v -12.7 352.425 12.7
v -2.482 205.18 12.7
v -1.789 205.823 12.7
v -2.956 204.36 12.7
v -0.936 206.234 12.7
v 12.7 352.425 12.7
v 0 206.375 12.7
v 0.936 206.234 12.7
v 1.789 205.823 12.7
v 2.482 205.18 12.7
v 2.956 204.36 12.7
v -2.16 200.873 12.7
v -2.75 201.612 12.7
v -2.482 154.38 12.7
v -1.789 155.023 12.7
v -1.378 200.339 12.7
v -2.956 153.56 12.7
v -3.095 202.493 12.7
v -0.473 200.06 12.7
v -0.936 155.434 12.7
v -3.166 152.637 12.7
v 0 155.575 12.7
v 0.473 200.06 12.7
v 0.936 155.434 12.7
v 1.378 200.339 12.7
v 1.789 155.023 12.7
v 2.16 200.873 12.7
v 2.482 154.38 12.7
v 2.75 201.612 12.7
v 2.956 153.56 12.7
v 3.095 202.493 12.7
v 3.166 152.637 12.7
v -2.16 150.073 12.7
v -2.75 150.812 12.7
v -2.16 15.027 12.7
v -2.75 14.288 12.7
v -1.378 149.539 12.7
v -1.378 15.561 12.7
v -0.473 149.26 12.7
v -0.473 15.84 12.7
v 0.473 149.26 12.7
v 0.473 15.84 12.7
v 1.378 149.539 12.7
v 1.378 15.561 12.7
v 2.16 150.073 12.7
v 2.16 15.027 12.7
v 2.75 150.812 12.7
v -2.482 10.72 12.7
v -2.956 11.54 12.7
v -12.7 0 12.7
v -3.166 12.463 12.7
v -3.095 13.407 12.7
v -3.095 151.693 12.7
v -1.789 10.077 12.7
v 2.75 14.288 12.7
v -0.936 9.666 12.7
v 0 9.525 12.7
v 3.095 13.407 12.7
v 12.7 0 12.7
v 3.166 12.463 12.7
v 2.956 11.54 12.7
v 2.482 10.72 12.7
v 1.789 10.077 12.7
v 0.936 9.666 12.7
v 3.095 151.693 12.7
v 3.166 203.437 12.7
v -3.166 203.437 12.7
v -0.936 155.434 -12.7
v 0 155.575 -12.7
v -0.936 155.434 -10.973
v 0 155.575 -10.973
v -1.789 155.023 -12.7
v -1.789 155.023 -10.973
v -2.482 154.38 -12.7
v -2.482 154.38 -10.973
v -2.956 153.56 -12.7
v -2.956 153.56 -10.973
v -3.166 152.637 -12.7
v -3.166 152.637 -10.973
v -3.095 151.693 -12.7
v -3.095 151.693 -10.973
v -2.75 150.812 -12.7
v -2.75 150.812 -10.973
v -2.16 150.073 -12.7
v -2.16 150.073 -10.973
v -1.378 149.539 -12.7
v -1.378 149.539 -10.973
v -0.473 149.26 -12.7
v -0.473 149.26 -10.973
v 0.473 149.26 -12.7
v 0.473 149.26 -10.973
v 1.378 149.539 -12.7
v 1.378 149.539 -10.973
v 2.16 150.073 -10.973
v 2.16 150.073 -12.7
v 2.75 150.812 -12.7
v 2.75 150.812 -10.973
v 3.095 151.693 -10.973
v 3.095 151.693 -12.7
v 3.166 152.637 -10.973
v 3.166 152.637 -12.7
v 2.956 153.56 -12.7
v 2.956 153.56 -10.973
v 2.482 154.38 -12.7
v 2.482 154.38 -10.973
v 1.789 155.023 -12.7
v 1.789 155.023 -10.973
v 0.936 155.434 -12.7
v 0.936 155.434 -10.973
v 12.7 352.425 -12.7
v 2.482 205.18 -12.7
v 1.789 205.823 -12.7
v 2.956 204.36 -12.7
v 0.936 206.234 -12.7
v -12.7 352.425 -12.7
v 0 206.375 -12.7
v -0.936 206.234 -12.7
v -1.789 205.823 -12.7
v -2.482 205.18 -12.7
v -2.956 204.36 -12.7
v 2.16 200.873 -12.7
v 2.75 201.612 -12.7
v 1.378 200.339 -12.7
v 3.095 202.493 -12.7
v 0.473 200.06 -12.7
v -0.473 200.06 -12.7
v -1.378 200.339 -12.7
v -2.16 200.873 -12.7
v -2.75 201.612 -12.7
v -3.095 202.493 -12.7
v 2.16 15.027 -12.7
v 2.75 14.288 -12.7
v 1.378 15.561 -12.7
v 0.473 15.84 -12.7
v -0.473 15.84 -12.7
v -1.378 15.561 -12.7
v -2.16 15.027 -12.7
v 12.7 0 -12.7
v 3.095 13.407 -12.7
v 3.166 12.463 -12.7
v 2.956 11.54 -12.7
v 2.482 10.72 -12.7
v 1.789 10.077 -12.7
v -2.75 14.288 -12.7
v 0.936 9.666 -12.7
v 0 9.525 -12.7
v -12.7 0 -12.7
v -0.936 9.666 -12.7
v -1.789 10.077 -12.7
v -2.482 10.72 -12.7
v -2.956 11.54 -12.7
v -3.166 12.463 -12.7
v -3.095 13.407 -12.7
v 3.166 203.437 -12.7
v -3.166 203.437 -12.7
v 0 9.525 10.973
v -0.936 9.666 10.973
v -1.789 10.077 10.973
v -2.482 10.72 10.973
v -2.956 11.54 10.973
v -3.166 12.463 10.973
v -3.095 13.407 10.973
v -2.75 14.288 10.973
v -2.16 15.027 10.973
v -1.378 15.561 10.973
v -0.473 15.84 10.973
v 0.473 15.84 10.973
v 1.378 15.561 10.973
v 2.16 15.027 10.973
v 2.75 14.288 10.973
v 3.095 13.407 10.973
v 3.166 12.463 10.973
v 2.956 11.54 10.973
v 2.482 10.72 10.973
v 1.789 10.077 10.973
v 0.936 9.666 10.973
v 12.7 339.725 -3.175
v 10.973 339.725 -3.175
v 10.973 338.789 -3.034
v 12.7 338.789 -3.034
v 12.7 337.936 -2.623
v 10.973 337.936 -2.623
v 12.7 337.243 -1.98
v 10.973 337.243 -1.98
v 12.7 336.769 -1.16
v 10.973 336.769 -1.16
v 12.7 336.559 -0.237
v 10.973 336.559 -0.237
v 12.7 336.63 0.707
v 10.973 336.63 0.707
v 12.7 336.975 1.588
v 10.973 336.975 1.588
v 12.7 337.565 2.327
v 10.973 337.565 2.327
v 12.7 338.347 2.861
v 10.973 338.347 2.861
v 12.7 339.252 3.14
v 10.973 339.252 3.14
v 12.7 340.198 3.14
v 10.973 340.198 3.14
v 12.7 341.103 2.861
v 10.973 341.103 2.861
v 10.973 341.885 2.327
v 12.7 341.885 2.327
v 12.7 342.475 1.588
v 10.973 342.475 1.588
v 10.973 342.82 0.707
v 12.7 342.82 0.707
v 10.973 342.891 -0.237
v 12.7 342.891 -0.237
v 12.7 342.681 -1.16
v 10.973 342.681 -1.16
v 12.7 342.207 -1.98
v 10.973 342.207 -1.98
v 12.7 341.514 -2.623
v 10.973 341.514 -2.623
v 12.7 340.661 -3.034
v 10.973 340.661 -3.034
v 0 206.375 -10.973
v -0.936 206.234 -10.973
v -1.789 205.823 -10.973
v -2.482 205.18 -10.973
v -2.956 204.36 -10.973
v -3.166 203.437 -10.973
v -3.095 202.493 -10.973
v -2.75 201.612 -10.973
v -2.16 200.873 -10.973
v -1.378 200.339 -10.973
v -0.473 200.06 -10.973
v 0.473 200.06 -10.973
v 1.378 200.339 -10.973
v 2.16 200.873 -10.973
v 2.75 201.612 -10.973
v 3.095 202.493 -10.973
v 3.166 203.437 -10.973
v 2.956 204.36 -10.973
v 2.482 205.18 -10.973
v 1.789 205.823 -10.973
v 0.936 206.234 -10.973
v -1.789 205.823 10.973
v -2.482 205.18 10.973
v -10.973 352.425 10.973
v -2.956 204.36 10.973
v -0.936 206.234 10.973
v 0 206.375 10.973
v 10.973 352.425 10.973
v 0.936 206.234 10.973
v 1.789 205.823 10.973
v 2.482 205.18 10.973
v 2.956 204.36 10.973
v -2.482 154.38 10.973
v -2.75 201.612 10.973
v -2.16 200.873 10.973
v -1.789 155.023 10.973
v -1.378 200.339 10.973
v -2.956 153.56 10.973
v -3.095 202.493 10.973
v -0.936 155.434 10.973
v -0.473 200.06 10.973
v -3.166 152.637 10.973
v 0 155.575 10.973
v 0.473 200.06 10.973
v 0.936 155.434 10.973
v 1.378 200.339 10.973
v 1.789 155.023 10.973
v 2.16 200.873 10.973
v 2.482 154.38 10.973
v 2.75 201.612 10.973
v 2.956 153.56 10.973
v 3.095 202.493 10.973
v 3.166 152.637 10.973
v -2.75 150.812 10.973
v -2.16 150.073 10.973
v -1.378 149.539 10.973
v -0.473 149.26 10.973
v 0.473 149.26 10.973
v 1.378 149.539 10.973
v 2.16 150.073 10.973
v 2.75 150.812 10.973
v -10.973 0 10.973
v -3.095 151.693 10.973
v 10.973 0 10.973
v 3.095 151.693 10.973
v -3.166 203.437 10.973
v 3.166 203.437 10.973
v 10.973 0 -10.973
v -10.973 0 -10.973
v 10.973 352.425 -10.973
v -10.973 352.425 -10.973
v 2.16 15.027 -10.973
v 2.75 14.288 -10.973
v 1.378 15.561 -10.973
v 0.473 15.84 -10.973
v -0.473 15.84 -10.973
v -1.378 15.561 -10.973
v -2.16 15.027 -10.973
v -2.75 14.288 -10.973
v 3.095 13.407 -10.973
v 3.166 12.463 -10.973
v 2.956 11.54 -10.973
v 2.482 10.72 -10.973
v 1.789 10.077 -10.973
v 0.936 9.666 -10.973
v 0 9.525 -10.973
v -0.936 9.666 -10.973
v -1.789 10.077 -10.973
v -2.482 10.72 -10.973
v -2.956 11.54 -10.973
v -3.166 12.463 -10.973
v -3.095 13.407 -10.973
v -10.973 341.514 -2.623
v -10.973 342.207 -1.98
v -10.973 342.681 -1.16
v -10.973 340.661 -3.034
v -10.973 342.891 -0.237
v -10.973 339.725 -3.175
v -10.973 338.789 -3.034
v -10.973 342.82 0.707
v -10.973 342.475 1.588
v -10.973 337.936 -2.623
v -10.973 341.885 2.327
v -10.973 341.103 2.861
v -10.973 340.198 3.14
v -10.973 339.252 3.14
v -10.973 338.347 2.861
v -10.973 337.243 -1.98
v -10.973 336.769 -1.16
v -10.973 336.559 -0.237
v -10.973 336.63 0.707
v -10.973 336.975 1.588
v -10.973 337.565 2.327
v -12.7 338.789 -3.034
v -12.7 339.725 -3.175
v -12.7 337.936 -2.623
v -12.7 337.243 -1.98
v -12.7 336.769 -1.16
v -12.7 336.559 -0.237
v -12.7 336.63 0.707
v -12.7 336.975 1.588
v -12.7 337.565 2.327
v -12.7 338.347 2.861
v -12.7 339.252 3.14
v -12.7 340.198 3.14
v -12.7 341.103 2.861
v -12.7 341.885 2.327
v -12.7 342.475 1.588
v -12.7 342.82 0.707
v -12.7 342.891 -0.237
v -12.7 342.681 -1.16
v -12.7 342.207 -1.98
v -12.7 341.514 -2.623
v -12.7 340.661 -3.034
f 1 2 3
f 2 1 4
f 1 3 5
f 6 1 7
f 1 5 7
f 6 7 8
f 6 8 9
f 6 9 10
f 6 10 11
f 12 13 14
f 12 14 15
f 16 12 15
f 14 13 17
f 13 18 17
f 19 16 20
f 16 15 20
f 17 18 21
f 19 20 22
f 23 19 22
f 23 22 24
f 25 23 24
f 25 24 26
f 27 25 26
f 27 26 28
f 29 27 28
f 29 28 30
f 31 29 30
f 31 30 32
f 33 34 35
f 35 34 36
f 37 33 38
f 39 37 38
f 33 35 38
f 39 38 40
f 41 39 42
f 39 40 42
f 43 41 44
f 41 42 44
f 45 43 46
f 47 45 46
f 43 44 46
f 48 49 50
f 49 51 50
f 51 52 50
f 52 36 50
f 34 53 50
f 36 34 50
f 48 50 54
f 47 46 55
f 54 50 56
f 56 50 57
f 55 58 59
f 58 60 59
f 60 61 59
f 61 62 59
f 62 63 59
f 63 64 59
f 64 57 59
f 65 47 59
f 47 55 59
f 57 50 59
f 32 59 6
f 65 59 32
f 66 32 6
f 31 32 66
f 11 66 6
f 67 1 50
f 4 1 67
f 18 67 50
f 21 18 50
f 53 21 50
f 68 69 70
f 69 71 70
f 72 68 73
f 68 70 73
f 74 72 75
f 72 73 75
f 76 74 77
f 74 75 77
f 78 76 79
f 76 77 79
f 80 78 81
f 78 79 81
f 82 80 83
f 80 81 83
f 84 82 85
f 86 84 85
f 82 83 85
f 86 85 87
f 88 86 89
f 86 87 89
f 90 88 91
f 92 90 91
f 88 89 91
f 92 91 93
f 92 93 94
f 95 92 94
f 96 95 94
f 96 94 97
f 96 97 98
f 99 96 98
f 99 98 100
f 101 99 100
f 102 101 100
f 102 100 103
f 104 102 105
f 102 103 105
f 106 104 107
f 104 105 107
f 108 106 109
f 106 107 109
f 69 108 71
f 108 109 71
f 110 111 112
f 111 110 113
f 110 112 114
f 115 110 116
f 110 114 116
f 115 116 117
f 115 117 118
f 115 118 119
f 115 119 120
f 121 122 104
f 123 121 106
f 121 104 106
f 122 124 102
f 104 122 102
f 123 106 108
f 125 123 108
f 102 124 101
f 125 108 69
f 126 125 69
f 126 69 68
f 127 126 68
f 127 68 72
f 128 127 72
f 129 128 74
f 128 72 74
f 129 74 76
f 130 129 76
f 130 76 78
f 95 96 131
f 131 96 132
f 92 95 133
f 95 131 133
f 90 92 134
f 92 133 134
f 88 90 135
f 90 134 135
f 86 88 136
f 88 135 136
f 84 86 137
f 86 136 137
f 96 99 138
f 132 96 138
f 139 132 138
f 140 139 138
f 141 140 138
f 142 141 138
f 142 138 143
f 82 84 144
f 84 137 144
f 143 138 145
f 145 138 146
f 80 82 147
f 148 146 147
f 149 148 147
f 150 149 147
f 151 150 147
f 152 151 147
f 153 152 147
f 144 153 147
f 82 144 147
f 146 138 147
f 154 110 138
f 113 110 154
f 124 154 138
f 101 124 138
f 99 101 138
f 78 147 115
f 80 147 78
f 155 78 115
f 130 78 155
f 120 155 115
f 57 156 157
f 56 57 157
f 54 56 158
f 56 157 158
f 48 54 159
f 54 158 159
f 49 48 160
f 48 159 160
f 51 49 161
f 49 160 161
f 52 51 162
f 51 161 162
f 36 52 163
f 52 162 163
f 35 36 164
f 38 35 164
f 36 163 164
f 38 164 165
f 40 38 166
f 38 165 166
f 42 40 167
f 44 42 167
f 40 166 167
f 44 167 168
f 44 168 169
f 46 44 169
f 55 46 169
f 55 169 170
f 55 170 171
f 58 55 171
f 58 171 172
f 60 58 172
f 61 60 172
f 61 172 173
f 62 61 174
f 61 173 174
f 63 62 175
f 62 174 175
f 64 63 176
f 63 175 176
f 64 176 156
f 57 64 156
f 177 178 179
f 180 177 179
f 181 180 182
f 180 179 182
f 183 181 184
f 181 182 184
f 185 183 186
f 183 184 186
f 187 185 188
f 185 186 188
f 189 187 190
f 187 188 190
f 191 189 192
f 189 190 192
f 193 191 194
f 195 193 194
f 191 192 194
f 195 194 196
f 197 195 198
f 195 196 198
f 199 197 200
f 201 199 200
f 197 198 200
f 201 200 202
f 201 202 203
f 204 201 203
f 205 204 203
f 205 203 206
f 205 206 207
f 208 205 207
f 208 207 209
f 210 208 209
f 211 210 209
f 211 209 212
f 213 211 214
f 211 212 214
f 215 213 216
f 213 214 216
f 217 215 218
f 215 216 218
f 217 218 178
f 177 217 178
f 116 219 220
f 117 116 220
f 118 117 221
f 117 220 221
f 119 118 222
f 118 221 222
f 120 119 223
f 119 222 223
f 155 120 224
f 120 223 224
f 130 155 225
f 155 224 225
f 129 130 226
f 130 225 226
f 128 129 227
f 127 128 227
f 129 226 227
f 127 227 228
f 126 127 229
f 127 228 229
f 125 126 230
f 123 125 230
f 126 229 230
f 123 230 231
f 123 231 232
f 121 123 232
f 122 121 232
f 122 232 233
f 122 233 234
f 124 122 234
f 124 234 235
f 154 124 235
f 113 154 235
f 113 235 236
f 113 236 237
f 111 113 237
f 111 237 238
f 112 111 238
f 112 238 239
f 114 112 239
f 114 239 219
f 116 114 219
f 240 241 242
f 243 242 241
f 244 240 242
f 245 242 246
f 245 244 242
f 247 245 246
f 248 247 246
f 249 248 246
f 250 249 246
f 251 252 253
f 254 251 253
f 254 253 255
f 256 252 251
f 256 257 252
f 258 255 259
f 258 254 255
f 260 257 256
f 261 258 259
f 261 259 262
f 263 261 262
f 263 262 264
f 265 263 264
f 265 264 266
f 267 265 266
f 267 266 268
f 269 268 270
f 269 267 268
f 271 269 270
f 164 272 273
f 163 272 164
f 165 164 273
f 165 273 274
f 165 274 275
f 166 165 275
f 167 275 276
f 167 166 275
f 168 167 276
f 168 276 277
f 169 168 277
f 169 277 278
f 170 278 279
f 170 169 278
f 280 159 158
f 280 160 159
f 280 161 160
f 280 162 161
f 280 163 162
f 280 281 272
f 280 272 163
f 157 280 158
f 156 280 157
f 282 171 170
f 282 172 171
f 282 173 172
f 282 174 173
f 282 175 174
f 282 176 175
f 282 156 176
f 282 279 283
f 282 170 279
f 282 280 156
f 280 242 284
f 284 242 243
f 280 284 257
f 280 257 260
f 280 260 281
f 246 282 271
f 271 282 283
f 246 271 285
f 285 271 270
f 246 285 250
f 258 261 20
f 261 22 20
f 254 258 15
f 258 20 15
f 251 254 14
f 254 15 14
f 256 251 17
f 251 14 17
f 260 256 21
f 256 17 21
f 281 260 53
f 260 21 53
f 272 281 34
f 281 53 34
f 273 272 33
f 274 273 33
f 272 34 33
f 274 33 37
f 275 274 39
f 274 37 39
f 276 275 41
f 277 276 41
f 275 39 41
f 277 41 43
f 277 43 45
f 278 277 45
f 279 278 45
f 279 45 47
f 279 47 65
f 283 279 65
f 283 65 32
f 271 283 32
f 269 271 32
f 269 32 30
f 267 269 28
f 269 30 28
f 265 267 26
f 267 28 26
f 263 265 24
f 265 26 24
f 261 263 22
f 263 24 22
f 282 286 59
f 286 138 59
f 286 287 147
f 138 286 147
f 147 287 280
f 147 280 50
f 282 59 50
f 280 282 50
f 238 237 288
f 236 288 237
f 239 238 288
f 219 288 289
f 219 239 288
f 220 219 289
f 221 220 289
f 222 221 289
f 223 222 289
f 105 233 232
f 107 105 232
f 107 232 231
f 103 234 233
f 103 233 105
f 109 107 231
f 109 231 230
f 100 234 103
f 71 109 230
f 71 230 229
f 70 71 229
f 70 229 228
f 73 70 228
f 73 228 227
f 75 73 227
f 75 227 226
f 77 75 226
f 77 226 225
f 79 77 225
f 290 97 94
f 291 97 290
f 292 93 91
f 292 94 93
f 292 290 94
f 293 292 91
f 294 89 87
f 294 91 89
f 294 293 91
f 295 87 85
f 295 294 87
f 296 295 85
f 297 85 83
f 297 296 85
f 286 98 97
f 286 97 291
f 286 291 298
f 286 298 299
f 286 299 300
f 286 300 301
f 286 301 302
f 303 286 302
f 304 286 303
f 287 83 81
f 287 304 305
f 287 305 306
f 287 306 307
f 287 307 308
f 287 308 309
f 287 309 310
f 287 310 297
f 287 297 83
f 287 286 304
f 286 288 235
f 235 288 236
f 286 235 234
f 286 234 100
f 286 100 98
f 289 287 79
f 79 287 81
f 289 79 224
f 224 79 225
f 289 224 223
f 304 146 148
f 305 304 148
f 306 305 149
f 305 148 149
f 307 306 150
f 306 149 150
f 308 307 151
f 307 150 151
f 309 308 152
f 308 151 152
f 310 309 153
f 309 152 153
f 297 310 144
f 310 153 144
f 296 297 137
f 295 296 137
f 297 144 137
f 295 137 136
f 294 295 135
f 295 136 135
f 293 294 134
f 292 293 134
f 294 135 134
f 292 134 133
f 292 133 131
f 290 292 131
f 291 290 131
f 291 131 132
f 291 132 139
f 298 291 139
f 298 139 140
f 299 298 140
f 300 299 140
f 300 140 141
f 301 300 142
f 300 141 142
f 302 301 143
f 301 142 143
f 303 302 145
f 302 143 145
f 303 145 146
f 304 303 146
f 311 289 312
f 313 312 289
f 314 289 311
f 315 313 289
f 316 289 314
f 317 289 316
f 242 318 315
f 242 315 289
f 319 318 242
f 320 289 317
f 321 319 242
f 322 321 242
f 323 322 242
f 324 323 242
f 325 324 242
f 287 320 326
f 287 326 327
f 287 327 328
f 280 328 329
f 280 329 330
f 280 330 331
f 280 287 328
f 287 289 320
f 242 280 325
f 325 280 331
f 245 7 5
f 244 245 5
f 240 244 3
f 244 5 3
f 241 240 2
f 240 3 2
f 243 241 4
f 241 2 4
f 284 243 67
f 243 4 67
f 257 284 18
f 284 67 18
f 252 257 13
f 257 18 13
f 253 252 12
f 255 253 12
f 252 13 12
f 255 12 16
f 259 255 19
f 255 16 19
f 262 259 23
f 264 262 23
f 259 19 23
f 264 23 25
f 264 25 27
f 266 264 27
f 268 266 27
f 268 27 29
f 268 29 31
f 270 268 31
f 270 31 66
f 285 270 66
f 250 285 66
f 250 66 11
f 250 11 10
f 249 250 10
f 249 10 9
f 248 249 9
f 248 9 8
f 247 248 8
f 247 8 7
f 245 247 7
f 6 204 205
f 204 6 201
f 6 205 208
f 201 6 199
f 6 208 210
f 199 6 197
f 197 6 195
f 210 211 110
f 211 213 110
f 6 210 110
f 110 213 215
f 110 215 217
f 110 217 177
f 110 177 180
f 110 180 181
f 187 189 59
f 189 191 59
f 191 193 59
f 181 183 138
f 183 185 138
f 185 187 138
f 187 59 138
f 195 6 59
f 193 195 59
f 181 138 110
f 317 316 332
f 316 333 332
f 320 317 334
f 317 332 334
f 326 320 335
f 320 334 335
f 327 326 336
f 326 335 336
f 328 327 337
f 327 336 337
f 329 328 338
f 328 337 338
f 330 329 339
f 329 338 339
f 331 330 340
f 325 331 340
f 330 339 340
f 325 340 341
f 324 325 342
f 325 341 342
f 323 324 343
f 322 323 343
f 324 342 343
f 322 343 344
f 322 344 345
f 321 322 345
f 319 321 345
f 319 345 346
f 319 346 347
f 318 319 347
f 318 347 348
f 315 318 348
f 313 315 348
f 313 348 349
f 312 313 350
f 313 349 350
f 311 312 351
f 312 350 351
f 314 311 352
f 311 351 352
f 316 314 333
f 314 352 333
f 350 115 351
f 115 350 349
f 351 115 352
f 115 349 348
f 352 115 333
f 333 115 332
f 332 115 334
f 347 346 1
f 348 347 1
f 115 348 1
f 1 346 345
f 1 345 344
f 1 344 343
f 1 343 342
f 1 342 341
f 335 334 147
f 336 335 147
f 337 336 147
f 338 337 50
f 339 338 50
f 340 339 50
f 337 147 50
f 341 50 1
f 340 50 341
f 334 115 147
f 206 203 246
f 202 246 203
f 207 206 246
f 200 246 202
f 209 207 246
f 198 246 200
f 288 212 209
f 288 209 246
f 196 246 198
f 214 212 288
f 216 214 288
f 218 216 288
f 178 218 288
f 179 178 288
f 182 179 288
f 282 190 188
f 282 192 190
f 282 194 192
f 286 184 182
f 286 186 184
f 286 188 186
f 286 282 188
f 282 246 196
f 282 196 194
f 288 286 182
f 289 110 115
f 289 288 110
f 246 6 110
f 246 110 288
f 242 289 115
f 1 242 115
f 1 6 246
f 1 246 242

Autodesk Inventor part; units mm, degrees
ref_plane "YZ Plane" through (0, 0, 0) normal (1, 0, 0) x (0, 1, 0)
ref_plane "XZ Plane" through (0, 0, 0) normal (0, 1, 0) x (-1, 0, 0)
ref_plane "XY Plane" through (0, 0, 0) normal (0, 0, 1) x (1, 0, 0)
sketch "Sketch1" plane through (0, 0, 0) normal (0, 1, 0) x (-1, 0, 0)
  line L0 (-12.7, -12.7) -> (12.7, -12.7)
  line L1 (12.7, -12.7) -> (12.7, 12.7)
  line L2 (12.7, 12.7) -> (-12.7, 12.7)
  line L3 (-12.7, 12.7) -> (-12.7, -12.7)
  line L4 (-12.7, -12.7) -> (12.7, 12.7) construction
  line L5 (12.7, -12.7) -> (-12.7, 12.7) construction
  line L6 (-10.9728, -10.9728) -> (10.9728, -10.9728)
  line L7 (10.9728, -10.9728) -> (10.9728, 10.9728)
  line L8 (10.9728, 10.9728) -> (-10.9728, 10.9728)
  line L9 (-10.9728, 10.9728) -> (-10.9728, -10.9728)
  line L10 (-10.9728, -10.9728) -> (10.9728, 10.9728) construction
  line L11 (10.9728, -10.9728) -> (-10.9728, 10.9728) construction
  point P0 (0, 0)
  dimension "d0" = 25.4
  dimension "d2" = 25.4
  dimension "d3" = 1.7272
  dimension "d4" = 1.7272
extrude "Extrusion1" add sketch "Sketch1" along normal blind 352.425
sketch "Sketch2" plane through (12.7, 0, 12.7) normal (1, 0, 0) x (0, 0, -1)
  line L0 (0, 352.425) -> (25.4, 352.425) projected
  line L1 (0, 0) -> (0, 352.425) projected
  point P0 (12.7, 0)
  point P1 (12.7, 339.725)
  dimension "d7" = 12.7
  dimension "d8" = 12.7
hole "Hole1" at (12.7, 339.725, 0) direction (-1, 0, 0) diameter 6.35 end through all
sketch "Sketch4" plane through (-12.7, 0, 12.7) normal (0, 0, 1) x (1, 0, 0)
  line L0 (0, 0) -> (25.4, 0) projected
  line L1 (25.4, 0) -> (25.4, 352.425) projected
  point P0 (12.7, 0)
  point P1 (12.7, 12.7)
  dimension "d25" = 12.7
  dimension "d26" = 12.7
hole "Hole3" at (0, 12.7, 12.7) direction (0, 0, -1) diameter 6.35 end through all
sketch "Sketch5" plane through (12.7, 0, -12.7) normal (0, 0, -1) x (-1, 0, 0)
  line L0 (0, 0) -> (25.4, 0) projected
  line L1 (25.4, 0) -> (25.4, 352.425) projected
  line L2 (0, 352.425) -> (25.4, 352.425) projected
  point P0 (12.7, 0)
  point P1 (12.7, 203.2)
  point P2 (12.7, 152.4)
  dimension "d34" = 50.8
  dimension "d36" = 152.4
  dimension "d38" = 149.225
  dimension "d39" = 352.425
  dimension "d40" = 12.7
  dimension "d41" = 12.7
hole "Hole4" at (0, 203.2, -12.7) at (0, 152.4, -12.7) direction (0, 0, 1) diameter 6.35 end through all
properties part number "BAseBAr" material "Aluminum 6061"
